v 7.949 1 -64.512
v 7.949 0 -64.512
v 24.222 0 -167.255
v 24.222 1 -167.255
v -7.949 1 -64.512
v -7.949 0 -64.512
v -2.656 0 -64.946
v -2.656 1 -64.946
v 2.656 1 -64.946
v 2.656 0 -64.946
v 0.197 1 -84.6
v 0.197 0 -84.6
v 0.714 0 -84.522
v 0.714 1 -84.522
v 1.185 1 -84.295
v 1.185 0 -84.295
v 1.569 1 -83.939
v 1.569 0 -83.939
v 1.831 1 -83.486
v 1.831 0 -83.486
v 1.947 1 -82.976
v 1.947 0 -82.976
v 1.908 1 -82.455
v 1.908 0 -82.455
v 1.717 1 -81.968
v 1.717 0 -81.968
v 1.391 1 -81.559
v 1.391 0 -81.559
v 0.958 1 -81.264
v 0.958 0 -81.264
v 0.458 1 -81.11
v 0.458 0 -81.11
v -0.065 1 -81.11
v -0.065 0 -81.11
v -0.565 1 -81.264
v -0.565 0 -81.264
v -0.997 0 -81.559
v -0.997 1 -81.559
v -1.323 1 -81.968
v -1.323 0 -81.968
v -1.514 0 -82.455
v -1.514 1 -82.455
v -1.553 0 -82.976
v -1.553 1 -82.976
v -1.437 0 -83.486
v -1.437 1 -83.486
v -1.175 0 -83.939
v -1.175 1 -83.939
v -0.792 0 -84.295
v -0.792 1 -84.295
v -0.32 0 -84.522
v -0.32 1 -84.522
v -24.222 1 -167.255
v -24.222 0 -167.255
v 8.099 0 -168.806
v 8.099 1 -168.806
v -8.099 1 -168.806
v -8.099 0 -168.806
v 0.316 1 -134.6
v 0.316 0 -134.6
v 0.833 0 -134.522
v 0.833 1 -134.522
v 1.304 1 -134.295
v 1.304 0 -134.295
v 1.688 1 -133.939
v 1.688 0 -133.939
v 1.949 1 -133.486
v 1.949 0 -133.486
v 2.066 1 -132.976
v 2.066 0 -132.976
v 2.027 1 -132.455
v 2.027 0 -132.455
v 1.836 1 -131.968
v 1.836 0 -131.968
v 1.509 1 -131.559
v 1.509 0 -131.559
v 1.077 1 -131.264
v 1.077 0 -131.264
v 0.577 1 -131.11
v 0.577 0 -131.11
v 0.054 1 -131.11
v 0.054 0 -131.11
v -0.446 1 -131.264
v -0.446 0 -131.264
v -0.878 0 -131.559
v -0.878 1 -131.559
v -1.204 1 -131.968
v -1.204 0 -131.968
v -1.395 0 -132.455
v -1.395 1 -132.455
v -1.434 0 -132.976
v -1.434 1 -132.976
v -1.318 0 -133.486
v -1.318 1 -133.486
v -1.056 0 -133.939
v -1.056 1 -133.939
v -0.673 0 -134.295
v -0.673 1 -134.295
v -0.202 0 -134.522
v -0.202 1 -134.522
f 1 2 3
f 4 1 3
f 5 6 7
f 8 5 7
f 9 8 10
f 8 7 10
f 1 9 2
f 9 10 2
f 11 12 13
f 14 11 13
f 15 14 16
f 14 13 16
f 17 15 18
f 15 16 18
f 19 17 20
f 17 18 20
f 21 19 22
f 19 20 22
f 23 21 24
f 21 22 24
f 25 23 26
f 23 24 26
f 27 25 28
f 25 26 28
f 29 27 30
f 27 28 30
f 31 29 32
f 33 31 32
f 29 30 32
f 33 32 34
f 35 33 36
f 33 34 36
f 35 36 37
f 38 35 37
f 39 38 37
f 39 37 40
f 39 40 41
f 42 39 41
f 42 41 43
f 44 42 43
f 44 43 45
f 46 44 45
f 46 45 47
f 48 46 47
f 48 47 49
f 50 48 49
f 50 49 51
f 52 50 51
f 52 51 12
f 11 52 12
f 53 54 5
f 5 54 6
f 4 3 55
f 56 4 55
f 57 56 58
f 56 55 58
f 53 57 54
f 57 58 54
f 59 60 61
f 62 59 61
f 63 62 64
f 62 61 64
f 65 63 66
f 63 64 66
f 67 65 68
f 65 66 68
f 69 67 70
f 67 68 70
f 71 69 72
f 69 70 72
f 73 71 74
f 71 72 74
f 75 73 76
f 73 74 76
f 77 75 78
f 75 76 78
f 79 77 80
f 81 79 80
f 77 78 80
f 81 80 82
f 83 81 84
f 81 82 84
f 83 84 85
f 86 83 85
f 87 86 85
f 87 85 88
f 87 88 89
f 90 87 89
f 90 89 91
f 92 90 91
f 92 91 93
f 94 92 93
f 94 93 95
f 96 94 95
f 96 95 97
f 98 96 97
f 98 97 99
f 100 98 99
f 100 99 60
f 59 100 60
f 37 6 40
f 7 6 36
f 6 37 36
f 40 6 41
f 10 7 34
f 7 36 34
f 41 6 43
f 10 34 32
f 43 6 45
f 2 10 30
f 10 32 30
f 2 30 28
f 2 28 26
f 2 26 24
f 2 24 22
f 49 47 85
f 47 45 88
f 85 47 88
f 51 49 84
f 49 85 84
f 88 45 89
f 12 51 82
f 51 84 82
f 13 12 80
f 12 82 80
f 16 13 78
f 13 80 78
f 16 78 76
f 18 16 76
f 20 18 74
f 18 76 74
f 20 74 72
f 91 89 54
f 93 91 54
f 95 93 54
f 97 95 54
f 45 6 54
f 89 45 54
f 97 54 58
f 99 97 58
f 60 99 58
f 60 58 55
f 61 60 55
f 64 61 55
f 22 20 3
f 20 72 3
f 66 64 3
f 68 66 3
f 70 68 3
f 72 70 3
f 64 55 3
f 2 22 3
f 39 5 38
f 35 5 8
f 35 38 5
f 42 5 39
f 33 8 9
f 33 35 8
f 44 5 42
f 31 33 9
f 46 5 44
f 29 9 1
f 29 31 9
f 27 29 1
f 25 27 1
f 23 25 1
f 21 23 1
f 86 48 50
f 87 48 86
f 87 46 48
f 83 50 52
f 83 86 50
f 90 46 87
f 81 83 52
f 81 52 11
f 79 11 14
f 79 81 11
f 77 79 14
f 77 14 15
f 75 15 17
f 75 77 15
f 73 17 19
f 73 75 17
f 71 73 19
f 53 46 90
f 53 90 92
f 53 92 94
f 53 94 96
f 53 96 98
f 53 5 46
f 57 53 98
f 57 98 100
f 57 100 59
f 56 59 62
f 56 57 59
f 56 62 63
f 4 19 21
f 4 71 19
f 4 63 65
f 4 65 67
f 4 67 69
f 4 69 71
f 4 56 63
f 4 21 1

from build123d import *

# Parameters (mm, degrees)
BOSS_EXTRUDE1_DEPTH = 1
SKETCH3_R           = 1.755
CUT_EXTRUDE2_DEPTH  = 171.729965471


with BuildPart() as part:
    # Sketch1 → Boss-Extrude1 (new body)
    with BuildSketch(Plane(origin=(0, 0, 0), x_dir=(1, 0, 0), z_dir=(0, 1, 0))):
        with BuildLine():
            Line((-24.22232668, 167.255131133), (-7.949423814, 64.512066011))
            ThreePointArc((-7.949423814, 64.512066011), (0, 65), (7.949423814, 64.512066011))
            Line((7.949423814, 64.512066011), (24.22232668, 167.255131133))
            ThreePointArc((24.22232668, 167.255131133), (0, 169), (-24.22232668, 167.255131133))
        make_face()
    extrude(amount=BOSS_EXTRUDE1_DEPTH)

    # Sketch3 → Cut-Extrude2 (cut, through all)
    with BuildSketch(Plane.XZ):
        with Locations(Location((0.196844211, -82.845225749, 0), (0, 0, 270))):
            Circle(SKETCH3_R)
        with Locations(Location((0.315646263, -132.845084609, 0), (0, 0, 270))):
            Circle(SKETCH3_R)
    extrude(amount=-CUT_EXTRUDE2_DEPTH, mode=Mode.SUBTRACT)


solid = part.part
